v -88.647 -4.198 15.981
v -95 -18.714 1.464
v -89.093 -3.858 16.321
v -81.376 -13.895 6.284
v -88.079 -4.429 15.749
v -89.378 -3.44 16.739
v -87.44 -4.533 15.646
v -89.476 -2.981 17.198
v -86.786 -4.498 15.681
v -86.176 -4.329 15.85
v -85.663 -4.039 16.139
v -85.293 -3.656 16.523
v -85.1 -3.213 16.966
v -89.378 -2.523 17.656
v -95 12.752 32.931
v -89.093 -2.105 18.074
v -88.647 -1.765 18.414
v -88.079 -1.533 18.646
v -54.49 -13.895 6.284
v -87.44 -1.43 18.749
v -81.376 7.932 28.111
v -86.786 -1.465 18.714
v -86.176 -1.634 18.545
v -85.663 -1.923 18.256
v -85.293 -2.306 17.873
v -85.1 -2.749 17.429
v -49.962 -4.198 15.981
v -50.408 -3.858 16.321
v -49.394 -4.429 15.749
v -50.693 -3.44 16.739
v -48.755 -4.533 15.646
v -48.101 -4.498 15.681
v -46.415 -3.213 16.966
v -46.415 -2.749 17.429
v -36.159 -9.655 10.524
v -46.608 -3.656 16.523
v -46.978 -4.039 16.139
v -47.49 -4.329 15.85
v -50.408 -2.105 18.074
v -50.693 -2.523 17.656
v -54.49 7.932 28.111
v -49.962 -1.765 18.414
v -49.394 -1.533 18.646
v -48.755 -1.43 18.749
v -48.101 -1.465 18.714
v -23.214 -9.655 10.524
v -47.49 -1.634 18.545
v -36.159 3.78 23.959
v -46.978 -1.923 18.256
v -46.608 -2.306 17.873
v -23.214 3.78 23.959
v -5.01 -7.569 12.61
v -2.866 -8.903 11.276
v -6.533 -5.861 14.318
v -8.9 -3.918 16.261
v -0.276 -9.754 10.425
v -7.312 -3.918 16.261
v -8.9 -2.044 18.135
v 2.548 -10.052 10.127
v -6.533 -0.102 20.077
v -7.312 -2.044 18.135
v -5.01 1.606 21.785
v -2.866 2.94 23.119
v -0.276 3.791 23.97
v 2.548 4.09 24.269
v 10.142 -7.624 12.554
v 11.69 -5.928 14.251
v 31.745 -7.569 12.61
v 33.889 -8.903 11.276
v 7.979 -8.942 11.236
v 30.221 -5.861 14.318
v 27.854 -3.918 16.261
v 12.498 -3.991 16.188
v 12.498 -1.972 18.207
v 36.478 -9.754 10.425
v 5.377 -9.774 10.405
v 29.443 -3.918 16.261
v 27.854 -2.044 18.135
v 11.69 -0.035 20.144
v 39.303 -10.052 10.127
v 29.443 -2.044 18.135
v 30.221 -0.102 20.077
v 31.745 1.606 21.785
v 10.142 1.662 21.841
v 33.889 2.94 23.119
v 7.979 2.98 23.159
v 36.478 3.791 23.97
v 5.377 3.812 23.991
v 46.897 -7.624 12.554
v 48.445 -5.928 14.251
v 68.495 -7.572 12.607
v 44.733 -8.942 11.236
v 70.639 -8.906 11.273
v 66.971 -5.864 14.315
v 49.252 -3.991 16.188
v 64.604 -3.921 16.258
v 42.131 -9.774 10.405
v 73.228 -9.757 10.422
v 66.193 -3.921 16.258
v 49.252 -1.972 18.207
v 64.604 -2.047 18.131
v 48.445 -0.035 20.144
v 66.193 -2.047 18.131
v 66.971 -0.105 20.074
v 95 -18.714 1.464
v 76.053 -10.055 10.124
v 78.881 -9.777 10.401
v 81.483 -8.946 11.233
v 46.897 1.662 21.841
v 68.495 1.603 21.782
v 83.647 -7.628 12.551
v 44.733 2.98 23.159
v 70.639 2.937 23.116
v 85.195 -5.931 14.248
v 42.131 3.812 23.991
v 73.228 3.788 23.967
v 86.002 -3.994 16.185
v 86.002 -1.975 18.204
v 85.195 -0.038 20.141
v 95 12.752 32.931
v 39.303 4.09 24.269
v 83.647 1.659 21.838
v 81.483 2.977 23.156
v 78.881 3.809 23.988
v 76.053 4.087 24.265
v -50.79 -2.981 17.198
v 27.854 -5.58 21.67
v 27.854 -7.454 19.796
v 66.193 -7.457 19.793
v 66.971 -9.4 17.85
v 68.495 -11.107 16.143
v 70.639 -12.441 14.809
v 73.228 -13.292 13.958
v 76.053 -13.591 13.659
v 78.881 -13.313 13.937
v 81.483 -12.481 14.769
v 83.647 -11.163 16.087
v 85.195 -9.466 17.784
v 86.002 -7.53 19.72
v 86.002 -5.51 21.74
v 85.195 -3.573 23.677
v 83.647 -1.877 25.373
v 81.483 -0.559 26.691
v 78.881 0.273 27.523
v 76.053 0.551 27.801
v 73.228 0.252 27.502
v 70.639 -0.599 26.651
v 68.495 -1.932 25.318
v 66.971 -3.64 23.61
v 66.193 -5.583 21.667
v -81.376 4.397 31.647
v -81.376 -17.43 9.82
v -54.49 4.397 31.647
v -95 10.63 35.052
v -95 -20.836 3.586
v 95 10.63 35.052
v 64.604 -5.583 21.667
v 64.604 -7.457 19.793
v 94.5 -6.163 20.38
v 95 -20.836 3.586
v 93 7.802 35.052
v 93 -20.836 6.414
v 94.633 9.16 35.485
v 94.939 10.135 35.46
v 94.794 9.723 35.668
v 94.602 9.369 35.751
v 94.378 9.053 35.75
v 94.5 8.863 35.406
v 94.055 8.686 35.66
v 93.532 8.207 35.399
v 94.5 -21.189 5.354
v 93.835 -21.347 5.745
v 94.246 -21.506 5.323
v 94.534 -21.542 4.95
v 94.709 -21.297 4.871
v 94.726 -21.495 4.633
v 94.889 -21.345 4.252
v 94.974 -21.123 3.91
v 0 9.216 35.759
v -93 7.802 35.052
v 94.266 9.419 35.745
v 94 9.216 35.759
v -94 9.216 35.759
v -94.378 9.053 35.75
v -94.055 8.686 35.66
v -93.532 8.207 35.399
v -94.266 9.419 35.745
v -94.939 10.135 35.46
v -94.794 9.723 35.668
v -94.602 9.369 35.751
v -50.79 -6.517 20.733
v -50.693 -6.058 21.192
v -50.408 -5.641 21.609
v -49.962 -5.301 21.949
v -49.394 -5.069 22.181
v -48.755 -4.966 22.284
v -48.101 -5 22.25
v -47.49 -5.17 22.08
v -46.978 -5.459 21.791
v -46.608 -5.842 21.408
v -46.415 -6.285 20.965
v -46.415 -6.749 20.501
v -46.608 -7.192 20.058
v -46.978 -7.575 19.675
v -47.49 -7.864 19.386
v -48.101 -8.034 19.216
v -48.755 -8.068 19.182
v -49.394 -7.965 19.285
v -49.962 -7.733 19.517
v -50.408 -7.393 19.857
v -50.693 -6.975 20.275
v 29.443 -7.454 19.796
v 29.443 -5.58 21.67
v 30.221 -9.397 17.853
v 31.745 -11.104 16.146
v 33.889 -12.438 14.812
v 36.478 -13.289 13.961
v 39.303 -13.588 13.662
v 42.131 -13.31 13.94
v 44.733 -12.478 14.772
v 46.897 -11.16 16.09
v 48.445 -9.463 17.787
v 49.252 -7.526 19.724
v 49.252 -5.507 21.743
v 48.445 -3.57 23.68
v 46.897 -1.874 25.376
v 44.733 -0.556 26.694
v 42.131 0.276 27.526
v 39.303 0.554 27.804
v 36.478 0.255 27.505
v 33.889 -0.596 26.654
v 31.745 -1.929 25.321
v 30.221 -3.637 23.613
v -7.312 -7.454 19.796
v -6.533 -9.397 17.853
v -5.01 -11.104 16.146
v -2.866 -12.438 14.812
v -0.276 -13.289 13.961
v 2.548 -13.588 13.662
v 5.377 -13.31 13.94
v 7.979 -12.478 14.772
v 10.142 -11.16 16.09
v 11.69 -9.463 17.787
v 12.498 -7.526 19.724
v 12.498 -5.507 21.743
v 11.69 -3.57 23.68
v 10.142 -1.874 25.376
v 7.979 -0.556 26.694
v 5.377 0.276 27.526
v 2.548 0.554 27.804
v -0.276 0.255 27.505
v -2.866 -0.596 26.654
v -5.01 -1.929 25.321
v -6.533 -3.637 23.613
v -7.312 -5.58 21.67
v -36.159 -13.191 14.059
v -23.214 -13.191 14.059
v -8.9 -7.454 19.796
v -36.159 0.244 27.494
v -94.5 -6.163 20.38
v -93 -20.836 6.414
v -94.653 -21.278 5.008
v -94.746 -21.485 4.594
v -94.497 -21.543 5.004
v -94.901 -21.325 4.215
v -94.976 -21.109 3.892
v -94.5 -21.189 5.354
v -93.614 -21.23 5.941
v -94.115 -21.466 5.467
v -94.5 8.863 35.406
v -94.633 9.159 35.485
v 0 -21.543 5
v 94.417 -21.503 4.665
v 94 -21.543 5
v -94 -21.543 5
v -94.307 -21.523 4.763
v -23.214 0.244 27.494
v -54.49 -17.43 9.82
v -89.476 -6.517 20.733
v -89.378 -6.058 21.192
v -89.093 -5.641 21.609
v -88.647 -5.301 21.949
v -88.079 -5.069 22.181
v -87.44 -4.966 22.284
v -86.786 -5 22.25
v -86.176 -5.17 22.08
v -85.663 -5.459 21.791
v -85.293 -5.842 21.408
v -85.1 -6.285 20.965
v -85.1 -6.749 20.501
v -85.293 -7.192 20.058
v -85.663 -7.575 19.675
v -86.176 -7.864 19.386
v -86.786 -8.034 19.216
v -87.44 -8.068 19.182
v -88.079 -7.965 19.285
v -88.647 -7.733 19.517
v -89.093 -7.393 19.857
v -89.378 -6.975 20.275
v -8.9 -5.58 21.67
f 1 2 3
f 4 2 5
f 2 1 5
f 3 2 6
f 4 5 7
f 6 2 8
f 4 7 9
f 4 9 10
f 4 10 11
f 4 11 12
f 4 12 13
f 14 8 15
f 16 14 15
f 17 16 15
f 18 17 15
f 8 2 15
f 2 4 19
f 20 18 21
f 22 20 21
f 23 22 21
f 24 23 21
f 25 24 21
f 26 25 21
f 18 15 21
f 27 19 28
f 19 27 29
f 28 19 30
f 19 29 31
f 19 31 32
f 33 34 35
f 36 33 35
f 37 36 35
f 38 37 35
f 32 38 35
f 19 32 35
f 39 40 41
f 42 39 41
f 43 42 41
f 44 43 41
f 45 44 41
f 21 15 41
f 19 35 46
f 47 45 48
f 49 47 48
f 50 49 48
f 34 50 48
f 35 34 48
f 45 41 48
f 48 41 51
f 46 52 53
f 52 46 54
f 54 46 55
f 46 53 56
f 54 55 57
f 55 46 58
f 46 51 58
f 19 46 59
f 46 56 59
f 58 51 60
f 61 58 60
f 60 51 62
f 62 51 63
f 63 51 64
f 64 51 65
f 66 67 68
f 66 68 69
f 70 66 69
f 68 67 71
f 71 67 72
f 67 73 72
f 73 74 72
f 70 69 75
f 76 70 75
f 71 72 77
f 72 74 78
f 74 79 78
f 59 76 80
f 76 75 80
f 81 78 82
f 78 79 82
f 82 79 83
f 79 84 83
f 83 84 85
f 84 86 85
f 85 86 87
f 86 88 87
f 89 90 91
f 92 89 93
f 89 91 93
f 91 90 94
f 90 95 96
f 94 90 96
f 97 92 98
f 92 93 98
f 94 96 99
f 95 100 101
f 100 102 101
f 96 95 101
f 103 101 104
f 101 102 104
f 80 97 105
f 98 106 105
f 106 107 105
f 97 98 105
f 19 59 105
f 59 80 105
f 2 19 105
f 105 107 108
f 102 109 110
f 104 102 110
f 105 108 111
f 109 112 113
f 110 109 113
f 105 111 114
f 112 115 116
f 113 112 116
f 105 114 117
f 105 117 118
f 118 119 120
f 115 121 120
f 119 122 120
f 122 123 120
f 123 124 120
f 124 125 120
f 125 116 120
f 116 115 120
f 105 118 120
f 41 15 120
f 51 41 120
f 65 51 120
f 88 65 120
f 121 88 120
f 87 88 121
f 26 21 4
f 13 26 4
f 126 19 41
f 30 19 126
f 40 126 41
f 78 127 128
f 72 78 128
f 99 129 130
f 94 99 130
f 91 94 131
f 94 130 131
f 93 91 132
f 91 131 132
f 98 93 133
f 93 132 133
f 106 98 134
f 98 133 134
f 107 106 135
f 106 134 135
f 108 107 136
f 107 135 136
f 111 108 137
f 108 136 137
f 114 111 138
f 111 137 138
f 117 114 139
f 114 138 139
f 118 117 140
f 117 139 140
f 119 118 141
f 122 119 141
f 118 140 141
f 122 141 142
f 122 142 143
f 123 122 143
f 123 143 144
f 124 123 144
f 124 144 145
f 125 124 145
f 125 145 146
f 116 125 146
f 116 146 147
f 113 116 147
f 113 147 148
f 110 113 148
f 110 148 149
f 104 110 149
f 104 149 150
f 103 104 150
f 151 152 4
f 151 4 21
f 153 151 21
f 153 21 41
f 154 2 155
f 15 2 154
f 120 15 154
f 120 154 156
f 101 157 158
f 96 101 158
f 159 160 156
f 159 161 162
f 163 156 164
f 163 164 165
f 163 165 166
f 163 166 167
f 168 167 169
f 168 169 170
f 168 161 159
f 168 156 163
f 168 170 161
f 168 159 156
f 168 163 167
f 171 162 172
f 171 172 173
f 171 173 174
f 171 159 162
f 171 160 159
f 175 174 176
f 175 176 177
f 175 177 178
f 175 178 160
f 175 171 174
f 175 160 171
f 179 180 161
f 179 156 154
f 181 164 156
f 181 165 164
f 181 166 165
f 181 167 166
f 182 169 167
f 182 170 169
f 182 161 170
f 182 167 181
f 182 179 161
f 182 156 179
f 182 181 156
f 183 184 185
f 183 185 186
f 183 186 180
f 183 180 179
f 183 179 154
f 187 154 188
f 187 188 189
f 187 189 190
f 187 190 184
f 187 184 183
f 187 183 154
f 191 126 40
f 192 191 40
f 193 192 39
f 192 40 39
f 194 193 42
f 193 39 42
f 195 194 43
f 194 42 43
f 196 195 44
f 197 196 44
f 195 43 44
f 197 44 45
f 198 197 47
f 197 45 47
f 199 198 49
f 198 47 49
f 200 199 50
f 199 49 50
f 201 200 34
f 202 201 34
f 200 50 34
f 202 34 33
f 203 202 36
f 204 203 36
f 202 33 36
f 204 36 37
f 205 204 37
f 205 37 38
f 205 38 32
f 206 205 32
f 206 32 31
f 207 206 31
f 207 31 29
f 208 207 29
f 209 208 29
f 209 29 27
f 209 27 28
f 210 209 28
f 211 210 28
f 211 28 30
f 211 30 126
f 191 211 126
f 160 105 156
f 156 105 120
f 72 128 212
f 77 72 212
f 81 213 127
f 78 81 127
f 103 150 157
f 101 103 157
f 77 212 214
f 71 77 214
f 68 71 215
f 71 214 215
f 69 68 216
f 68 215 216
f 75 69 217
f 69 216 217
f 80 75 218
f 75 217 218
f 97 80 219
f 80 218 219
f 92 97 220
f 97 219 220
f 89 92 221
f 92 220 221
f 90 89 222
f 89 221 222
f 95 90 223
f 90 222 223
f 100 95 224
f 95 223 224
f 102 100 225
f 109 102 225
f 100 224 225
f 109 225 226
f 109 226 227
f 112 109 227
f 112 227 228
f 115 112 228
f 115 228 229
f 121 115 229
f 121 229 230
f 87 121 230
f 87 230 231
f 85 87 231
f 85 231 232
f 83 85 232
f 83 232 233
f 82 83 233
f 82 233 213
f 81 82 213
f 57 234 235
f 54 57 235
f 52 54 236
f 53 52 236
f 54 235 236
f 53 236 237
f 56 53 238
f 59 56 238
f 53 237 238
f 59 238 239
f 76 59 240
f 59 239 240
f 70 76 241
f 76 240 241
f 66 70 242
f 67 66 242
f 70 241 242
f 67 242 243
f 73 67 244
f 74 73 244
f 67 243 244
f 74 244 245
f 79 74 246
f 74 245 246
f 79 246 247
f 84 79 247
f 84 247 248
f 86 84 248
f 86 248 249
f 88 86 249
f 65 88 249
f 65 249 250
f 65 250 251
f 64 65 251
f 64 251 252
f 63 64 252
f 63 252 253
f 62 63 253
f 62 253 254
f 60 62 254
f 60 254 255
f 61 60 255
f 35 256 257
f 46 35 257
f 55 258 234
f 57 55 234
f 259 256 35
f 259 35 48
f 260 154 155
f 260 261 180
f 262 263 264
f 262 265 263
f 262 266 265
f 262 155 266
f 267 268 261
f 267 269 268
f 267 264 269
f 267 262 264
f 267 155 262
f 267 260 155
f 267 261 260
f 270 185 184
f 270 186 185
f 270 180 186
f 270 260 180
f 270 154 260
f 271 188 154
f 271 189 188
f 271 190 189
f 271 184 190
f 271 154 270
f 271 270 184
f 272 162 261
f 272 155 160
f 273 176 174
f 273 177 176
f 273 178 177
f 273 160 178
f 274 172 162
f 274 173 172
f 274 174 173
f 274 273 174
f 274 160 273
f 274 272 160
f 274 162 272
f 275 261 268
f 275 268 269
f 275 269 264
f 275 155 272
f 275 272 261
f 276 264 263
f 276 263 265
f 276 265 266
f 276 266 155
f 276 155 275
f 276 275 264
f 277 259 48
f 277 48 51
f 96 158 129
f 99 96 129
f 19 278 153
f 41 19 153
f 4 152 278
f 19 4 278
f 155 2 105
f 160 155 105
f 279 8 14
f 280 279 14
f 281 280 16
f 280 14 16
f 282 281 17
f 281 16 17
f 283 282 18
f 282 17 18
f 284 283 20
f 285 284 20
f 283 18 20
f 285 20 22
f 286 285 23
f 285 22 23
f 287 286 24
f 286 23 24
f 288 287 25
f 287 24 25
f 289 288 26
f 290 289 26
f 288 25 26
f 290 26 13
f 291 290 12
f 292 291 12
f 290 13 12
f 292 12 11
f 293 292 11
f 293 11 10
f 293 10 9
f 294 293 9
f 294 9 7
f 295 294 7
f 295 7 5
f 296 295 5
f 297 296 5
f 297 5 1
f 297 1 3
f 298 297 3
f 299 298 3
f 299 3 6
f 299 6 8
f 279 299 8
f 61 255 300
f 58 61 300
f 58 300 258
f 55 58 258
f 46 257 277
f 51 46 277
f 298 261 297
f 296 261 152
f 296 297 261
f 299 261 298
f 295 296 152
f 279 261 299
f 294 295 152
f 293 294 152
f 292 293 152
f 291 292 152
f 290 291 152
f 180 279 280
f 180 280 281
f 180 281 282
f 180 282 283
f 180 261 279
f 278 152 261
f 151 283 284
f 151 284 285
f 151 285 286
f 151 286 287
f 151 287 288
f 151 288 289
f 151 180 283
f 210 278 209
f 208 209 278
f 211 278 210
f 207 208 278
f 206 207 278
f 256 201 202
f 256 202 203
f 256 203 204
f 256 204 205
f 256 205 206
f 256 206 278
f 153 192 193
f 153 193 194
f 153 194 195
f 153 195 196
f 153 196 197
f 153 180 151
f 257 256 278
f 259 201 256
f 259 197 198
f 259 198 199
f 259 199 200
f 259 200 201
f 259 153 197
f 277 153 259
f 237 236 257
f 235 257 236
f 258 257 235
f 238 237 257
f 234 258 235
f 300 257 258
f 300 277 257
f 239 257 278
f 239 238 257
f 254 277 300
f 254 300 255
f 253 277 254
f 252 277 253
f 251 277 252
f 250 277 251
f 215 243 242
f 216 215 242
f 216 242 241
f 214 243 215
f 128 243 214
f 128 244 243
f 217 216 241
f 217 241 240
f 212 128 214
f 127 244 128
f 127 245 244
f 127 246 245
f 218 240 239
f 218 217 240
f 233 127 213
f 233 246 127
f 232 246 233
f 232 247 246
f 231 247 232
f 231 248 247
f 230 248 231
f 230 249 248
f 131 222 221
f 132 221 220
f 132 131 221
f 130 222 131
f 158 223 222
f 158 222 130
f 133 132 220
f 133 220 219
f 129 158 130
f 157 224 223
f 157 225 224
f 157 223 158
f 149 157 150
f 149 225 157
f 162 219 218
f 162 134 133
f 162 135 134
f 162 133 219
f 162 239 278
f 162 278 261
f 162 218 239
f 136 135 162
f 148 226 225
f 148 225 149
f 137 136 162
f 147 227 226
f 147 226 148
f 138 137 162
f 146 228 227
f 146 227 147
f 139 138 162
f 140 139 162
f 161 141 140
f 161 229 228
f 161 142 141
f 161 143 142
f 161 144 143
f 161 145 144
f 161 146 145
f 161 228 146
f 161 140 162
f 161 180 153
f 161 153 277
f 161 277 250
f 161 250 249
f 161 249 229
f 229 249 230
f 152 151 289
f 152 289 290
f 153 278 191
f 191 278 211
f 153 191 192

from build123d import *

# Parameters (mm, degrees)
F0_W        = 190
F0_H        = 44.5
F1_DEPTH    = 5
F2_W        = 26.885152871
F2_H        = 30.8681384815
F2_W_2      = 12.9447032342
F2_H_2      = 19
F3_DEPTH    = 5.001
F4_D        = 4.4
F5_ANGLE    = -45
F6_T1_DEPTH = 54.5
F6_T3_DEPTH = 200
F6_T5_DEPTH = 54.5


# Not quite as in the source:
# - a fillet or chamfer that OpenCascade refuses, or shapes differently, is made with other operations: its cross-section is extruded or revolved along the edge and cut away or added


with BuildPart() as f1:
    # F0 (on Top) → F1 (new body)
    with BuildSketch(Plane.XY):
        Rectangle(F0_W, F0_H)
    extrude(amount=F1_DEPTH)

    # F2 (on face) → F3 (cut, through all)
    with BuildSketch(Plane.XY.offset(5)):
        with Locations((-67.9330339405, 0)):
            Rectangle(F2_W, F2_H)
        with Locations((-29.686499387, 0.061675)):
            Rectangle(F2_W_2, F2_H_2)
        with BuildLine():
            Line((-8.9000007138, -1.3249999611), (-7.3118307668, -1.3249999611))
            ThreePointArc((-7.3118307668, -1.3249999611), (12.5999992862, 3.89e-08), (-7.3118307668, 1.3250000389))
            Line((-7.3118307668, 1.3250000389), (-8.9000007138, 1.3250000389))
            Line((-8.9000007138, 1.3250000389), (-8.9000007138, -1.3249999611))
        make_face()
        with BuildLine():
            Line((27.8544989455, -1.3249999611), (29.4426688924, -1.3249999611))
            ThreePointArc((29.4426688924, -1.3249999611), (49.3544989455, 3.89e-08), (29.4426688924, 1.3250000389))
            Line((29.4426688924, 1.3250000389), (27.8544989455, 1.3250000389))
            Line((27.8544989455, 1.3250000389), (27.8544989455, -1.3249999611))
        make_face()
        with BuildLine():
            Line((64.6044989455, -1.3293345302), (66.1926688924, -1.3293345302))
            ThreePointArc((66.1926688924, -1.3293345302), (86.1044989455, -0.0043345302), (66.1926688924, 1.3206654698))
            Line((66.1926688924, 1.3206654698), (64.6044989455, 1.3206654698))
            Line((64.6044989455, 1.3206654698), (64.6044989455, -1.3293345302))
        make_face()
    extrude(amount=-F3_DEPTH, mode=Mode.SUBTRACT)

    # F4 (through all)
    with Locations(Plane.XY.offset(5)):
        with Locations((-87.275610376, 0), (-48.590457505, 0)):
            Hole(F4_D / 2)


with BuildPart() as f1_1:
    # F5: moved
    add(f1.part.rotate(Axis((0, -22.25, 5), (-1, 0, 0)), F5_ANGLE))

    # F6: fillet of radius 2 on 4 edges, made by hand

    # F6_s2 → F6_t1 (cut)
    with BuildSketch(Plane(origin=(0, 26.3767856687, 26.3767856687), x_dir=(1, 0, 0), z_dir=(0, -0.7071067812, -0.7071067812))):
        with BuildLine():
            add(Edge.make_bspline(
                [(-95, 17.2686597873), (-95, 19.2686597873), (-93, 19.2686597873)],
                knots=[0, 0, 0, 1, 1, 1], degree=2, weights=[1, 1, 1]))
            Line((-93, 19.2686597873), (-95, 19.2686597873))
            Line((-95, 19.2686597873), (-95, 17.2686597873))
        make_face()
    extrude(amount=F6_T1_DEPTH, mode=Mode.SUBTRACT)

    # F6_s4 → F6_t3 (cut)
    with BuildSketch(Plane.YZ.offset(-100)):
        with BuildLine():
            add(Edge.make_bspline(
                [(7.8020382004, 35.0520382004), (9.2162517628, 36.4662517628), (10.6304653252, 35.0520382004)],
                knots=[0, 0, 0, 1, 1, 1], degree=2, weights=[1, 1, 1]))
            Line((10.6304653252, 35.0520382004), (9.2162517628, 36.4662517628))
            Line((9.2162517628, 36.4662517628), (7.8020382004, 35.0520382004))
        make_face()
        with BuildLine():
            add(Edge.make_bspline(
                [(-20.8357864376, 3.5857864376), (-22.25, 5), (-20.8357864376, 6.4142135624)],
                knots=[0, 0, 0, 1, 1, 1], degree=2, weights=[1, 1, 1]))
            Line((-20.8357864376, 6.4142135624), (-22.25, 5))
            Line((-22.25, 5), (-20.8357864376, 3.5857864376))
        make_face()
    extrude(amount=F6_T3_DEPTH, mode=Mode.SUBTRACT)

    # F6_s6 → F6_t5 (cut)
    with BuildSketch(Plane(origin=(0, -12.1605339059, -12.1605339059), x_dir=(1, 0, 0), z_dir=(0, 0.7071067812, 0.7071067812))):
        with BuildLine():
            add(Edge.make_bspline(
                [(95, -17.2686597873), (95, -19.2686597873), (93, -19.2686597873)],
                knots=[0, 0, 0, 1, 1, 1], degree=2, weights=[1, 1, 1]))
            Line((93, -19.2686597873), (95, -19.2686597873))
            Line((95, -19.2686597873), (95, -17.2686597873))
        make_face()
    extrude(amount=F6_T5_DEPTH, mode=Mode.SUBTRACT)


solid = f1_1.part
